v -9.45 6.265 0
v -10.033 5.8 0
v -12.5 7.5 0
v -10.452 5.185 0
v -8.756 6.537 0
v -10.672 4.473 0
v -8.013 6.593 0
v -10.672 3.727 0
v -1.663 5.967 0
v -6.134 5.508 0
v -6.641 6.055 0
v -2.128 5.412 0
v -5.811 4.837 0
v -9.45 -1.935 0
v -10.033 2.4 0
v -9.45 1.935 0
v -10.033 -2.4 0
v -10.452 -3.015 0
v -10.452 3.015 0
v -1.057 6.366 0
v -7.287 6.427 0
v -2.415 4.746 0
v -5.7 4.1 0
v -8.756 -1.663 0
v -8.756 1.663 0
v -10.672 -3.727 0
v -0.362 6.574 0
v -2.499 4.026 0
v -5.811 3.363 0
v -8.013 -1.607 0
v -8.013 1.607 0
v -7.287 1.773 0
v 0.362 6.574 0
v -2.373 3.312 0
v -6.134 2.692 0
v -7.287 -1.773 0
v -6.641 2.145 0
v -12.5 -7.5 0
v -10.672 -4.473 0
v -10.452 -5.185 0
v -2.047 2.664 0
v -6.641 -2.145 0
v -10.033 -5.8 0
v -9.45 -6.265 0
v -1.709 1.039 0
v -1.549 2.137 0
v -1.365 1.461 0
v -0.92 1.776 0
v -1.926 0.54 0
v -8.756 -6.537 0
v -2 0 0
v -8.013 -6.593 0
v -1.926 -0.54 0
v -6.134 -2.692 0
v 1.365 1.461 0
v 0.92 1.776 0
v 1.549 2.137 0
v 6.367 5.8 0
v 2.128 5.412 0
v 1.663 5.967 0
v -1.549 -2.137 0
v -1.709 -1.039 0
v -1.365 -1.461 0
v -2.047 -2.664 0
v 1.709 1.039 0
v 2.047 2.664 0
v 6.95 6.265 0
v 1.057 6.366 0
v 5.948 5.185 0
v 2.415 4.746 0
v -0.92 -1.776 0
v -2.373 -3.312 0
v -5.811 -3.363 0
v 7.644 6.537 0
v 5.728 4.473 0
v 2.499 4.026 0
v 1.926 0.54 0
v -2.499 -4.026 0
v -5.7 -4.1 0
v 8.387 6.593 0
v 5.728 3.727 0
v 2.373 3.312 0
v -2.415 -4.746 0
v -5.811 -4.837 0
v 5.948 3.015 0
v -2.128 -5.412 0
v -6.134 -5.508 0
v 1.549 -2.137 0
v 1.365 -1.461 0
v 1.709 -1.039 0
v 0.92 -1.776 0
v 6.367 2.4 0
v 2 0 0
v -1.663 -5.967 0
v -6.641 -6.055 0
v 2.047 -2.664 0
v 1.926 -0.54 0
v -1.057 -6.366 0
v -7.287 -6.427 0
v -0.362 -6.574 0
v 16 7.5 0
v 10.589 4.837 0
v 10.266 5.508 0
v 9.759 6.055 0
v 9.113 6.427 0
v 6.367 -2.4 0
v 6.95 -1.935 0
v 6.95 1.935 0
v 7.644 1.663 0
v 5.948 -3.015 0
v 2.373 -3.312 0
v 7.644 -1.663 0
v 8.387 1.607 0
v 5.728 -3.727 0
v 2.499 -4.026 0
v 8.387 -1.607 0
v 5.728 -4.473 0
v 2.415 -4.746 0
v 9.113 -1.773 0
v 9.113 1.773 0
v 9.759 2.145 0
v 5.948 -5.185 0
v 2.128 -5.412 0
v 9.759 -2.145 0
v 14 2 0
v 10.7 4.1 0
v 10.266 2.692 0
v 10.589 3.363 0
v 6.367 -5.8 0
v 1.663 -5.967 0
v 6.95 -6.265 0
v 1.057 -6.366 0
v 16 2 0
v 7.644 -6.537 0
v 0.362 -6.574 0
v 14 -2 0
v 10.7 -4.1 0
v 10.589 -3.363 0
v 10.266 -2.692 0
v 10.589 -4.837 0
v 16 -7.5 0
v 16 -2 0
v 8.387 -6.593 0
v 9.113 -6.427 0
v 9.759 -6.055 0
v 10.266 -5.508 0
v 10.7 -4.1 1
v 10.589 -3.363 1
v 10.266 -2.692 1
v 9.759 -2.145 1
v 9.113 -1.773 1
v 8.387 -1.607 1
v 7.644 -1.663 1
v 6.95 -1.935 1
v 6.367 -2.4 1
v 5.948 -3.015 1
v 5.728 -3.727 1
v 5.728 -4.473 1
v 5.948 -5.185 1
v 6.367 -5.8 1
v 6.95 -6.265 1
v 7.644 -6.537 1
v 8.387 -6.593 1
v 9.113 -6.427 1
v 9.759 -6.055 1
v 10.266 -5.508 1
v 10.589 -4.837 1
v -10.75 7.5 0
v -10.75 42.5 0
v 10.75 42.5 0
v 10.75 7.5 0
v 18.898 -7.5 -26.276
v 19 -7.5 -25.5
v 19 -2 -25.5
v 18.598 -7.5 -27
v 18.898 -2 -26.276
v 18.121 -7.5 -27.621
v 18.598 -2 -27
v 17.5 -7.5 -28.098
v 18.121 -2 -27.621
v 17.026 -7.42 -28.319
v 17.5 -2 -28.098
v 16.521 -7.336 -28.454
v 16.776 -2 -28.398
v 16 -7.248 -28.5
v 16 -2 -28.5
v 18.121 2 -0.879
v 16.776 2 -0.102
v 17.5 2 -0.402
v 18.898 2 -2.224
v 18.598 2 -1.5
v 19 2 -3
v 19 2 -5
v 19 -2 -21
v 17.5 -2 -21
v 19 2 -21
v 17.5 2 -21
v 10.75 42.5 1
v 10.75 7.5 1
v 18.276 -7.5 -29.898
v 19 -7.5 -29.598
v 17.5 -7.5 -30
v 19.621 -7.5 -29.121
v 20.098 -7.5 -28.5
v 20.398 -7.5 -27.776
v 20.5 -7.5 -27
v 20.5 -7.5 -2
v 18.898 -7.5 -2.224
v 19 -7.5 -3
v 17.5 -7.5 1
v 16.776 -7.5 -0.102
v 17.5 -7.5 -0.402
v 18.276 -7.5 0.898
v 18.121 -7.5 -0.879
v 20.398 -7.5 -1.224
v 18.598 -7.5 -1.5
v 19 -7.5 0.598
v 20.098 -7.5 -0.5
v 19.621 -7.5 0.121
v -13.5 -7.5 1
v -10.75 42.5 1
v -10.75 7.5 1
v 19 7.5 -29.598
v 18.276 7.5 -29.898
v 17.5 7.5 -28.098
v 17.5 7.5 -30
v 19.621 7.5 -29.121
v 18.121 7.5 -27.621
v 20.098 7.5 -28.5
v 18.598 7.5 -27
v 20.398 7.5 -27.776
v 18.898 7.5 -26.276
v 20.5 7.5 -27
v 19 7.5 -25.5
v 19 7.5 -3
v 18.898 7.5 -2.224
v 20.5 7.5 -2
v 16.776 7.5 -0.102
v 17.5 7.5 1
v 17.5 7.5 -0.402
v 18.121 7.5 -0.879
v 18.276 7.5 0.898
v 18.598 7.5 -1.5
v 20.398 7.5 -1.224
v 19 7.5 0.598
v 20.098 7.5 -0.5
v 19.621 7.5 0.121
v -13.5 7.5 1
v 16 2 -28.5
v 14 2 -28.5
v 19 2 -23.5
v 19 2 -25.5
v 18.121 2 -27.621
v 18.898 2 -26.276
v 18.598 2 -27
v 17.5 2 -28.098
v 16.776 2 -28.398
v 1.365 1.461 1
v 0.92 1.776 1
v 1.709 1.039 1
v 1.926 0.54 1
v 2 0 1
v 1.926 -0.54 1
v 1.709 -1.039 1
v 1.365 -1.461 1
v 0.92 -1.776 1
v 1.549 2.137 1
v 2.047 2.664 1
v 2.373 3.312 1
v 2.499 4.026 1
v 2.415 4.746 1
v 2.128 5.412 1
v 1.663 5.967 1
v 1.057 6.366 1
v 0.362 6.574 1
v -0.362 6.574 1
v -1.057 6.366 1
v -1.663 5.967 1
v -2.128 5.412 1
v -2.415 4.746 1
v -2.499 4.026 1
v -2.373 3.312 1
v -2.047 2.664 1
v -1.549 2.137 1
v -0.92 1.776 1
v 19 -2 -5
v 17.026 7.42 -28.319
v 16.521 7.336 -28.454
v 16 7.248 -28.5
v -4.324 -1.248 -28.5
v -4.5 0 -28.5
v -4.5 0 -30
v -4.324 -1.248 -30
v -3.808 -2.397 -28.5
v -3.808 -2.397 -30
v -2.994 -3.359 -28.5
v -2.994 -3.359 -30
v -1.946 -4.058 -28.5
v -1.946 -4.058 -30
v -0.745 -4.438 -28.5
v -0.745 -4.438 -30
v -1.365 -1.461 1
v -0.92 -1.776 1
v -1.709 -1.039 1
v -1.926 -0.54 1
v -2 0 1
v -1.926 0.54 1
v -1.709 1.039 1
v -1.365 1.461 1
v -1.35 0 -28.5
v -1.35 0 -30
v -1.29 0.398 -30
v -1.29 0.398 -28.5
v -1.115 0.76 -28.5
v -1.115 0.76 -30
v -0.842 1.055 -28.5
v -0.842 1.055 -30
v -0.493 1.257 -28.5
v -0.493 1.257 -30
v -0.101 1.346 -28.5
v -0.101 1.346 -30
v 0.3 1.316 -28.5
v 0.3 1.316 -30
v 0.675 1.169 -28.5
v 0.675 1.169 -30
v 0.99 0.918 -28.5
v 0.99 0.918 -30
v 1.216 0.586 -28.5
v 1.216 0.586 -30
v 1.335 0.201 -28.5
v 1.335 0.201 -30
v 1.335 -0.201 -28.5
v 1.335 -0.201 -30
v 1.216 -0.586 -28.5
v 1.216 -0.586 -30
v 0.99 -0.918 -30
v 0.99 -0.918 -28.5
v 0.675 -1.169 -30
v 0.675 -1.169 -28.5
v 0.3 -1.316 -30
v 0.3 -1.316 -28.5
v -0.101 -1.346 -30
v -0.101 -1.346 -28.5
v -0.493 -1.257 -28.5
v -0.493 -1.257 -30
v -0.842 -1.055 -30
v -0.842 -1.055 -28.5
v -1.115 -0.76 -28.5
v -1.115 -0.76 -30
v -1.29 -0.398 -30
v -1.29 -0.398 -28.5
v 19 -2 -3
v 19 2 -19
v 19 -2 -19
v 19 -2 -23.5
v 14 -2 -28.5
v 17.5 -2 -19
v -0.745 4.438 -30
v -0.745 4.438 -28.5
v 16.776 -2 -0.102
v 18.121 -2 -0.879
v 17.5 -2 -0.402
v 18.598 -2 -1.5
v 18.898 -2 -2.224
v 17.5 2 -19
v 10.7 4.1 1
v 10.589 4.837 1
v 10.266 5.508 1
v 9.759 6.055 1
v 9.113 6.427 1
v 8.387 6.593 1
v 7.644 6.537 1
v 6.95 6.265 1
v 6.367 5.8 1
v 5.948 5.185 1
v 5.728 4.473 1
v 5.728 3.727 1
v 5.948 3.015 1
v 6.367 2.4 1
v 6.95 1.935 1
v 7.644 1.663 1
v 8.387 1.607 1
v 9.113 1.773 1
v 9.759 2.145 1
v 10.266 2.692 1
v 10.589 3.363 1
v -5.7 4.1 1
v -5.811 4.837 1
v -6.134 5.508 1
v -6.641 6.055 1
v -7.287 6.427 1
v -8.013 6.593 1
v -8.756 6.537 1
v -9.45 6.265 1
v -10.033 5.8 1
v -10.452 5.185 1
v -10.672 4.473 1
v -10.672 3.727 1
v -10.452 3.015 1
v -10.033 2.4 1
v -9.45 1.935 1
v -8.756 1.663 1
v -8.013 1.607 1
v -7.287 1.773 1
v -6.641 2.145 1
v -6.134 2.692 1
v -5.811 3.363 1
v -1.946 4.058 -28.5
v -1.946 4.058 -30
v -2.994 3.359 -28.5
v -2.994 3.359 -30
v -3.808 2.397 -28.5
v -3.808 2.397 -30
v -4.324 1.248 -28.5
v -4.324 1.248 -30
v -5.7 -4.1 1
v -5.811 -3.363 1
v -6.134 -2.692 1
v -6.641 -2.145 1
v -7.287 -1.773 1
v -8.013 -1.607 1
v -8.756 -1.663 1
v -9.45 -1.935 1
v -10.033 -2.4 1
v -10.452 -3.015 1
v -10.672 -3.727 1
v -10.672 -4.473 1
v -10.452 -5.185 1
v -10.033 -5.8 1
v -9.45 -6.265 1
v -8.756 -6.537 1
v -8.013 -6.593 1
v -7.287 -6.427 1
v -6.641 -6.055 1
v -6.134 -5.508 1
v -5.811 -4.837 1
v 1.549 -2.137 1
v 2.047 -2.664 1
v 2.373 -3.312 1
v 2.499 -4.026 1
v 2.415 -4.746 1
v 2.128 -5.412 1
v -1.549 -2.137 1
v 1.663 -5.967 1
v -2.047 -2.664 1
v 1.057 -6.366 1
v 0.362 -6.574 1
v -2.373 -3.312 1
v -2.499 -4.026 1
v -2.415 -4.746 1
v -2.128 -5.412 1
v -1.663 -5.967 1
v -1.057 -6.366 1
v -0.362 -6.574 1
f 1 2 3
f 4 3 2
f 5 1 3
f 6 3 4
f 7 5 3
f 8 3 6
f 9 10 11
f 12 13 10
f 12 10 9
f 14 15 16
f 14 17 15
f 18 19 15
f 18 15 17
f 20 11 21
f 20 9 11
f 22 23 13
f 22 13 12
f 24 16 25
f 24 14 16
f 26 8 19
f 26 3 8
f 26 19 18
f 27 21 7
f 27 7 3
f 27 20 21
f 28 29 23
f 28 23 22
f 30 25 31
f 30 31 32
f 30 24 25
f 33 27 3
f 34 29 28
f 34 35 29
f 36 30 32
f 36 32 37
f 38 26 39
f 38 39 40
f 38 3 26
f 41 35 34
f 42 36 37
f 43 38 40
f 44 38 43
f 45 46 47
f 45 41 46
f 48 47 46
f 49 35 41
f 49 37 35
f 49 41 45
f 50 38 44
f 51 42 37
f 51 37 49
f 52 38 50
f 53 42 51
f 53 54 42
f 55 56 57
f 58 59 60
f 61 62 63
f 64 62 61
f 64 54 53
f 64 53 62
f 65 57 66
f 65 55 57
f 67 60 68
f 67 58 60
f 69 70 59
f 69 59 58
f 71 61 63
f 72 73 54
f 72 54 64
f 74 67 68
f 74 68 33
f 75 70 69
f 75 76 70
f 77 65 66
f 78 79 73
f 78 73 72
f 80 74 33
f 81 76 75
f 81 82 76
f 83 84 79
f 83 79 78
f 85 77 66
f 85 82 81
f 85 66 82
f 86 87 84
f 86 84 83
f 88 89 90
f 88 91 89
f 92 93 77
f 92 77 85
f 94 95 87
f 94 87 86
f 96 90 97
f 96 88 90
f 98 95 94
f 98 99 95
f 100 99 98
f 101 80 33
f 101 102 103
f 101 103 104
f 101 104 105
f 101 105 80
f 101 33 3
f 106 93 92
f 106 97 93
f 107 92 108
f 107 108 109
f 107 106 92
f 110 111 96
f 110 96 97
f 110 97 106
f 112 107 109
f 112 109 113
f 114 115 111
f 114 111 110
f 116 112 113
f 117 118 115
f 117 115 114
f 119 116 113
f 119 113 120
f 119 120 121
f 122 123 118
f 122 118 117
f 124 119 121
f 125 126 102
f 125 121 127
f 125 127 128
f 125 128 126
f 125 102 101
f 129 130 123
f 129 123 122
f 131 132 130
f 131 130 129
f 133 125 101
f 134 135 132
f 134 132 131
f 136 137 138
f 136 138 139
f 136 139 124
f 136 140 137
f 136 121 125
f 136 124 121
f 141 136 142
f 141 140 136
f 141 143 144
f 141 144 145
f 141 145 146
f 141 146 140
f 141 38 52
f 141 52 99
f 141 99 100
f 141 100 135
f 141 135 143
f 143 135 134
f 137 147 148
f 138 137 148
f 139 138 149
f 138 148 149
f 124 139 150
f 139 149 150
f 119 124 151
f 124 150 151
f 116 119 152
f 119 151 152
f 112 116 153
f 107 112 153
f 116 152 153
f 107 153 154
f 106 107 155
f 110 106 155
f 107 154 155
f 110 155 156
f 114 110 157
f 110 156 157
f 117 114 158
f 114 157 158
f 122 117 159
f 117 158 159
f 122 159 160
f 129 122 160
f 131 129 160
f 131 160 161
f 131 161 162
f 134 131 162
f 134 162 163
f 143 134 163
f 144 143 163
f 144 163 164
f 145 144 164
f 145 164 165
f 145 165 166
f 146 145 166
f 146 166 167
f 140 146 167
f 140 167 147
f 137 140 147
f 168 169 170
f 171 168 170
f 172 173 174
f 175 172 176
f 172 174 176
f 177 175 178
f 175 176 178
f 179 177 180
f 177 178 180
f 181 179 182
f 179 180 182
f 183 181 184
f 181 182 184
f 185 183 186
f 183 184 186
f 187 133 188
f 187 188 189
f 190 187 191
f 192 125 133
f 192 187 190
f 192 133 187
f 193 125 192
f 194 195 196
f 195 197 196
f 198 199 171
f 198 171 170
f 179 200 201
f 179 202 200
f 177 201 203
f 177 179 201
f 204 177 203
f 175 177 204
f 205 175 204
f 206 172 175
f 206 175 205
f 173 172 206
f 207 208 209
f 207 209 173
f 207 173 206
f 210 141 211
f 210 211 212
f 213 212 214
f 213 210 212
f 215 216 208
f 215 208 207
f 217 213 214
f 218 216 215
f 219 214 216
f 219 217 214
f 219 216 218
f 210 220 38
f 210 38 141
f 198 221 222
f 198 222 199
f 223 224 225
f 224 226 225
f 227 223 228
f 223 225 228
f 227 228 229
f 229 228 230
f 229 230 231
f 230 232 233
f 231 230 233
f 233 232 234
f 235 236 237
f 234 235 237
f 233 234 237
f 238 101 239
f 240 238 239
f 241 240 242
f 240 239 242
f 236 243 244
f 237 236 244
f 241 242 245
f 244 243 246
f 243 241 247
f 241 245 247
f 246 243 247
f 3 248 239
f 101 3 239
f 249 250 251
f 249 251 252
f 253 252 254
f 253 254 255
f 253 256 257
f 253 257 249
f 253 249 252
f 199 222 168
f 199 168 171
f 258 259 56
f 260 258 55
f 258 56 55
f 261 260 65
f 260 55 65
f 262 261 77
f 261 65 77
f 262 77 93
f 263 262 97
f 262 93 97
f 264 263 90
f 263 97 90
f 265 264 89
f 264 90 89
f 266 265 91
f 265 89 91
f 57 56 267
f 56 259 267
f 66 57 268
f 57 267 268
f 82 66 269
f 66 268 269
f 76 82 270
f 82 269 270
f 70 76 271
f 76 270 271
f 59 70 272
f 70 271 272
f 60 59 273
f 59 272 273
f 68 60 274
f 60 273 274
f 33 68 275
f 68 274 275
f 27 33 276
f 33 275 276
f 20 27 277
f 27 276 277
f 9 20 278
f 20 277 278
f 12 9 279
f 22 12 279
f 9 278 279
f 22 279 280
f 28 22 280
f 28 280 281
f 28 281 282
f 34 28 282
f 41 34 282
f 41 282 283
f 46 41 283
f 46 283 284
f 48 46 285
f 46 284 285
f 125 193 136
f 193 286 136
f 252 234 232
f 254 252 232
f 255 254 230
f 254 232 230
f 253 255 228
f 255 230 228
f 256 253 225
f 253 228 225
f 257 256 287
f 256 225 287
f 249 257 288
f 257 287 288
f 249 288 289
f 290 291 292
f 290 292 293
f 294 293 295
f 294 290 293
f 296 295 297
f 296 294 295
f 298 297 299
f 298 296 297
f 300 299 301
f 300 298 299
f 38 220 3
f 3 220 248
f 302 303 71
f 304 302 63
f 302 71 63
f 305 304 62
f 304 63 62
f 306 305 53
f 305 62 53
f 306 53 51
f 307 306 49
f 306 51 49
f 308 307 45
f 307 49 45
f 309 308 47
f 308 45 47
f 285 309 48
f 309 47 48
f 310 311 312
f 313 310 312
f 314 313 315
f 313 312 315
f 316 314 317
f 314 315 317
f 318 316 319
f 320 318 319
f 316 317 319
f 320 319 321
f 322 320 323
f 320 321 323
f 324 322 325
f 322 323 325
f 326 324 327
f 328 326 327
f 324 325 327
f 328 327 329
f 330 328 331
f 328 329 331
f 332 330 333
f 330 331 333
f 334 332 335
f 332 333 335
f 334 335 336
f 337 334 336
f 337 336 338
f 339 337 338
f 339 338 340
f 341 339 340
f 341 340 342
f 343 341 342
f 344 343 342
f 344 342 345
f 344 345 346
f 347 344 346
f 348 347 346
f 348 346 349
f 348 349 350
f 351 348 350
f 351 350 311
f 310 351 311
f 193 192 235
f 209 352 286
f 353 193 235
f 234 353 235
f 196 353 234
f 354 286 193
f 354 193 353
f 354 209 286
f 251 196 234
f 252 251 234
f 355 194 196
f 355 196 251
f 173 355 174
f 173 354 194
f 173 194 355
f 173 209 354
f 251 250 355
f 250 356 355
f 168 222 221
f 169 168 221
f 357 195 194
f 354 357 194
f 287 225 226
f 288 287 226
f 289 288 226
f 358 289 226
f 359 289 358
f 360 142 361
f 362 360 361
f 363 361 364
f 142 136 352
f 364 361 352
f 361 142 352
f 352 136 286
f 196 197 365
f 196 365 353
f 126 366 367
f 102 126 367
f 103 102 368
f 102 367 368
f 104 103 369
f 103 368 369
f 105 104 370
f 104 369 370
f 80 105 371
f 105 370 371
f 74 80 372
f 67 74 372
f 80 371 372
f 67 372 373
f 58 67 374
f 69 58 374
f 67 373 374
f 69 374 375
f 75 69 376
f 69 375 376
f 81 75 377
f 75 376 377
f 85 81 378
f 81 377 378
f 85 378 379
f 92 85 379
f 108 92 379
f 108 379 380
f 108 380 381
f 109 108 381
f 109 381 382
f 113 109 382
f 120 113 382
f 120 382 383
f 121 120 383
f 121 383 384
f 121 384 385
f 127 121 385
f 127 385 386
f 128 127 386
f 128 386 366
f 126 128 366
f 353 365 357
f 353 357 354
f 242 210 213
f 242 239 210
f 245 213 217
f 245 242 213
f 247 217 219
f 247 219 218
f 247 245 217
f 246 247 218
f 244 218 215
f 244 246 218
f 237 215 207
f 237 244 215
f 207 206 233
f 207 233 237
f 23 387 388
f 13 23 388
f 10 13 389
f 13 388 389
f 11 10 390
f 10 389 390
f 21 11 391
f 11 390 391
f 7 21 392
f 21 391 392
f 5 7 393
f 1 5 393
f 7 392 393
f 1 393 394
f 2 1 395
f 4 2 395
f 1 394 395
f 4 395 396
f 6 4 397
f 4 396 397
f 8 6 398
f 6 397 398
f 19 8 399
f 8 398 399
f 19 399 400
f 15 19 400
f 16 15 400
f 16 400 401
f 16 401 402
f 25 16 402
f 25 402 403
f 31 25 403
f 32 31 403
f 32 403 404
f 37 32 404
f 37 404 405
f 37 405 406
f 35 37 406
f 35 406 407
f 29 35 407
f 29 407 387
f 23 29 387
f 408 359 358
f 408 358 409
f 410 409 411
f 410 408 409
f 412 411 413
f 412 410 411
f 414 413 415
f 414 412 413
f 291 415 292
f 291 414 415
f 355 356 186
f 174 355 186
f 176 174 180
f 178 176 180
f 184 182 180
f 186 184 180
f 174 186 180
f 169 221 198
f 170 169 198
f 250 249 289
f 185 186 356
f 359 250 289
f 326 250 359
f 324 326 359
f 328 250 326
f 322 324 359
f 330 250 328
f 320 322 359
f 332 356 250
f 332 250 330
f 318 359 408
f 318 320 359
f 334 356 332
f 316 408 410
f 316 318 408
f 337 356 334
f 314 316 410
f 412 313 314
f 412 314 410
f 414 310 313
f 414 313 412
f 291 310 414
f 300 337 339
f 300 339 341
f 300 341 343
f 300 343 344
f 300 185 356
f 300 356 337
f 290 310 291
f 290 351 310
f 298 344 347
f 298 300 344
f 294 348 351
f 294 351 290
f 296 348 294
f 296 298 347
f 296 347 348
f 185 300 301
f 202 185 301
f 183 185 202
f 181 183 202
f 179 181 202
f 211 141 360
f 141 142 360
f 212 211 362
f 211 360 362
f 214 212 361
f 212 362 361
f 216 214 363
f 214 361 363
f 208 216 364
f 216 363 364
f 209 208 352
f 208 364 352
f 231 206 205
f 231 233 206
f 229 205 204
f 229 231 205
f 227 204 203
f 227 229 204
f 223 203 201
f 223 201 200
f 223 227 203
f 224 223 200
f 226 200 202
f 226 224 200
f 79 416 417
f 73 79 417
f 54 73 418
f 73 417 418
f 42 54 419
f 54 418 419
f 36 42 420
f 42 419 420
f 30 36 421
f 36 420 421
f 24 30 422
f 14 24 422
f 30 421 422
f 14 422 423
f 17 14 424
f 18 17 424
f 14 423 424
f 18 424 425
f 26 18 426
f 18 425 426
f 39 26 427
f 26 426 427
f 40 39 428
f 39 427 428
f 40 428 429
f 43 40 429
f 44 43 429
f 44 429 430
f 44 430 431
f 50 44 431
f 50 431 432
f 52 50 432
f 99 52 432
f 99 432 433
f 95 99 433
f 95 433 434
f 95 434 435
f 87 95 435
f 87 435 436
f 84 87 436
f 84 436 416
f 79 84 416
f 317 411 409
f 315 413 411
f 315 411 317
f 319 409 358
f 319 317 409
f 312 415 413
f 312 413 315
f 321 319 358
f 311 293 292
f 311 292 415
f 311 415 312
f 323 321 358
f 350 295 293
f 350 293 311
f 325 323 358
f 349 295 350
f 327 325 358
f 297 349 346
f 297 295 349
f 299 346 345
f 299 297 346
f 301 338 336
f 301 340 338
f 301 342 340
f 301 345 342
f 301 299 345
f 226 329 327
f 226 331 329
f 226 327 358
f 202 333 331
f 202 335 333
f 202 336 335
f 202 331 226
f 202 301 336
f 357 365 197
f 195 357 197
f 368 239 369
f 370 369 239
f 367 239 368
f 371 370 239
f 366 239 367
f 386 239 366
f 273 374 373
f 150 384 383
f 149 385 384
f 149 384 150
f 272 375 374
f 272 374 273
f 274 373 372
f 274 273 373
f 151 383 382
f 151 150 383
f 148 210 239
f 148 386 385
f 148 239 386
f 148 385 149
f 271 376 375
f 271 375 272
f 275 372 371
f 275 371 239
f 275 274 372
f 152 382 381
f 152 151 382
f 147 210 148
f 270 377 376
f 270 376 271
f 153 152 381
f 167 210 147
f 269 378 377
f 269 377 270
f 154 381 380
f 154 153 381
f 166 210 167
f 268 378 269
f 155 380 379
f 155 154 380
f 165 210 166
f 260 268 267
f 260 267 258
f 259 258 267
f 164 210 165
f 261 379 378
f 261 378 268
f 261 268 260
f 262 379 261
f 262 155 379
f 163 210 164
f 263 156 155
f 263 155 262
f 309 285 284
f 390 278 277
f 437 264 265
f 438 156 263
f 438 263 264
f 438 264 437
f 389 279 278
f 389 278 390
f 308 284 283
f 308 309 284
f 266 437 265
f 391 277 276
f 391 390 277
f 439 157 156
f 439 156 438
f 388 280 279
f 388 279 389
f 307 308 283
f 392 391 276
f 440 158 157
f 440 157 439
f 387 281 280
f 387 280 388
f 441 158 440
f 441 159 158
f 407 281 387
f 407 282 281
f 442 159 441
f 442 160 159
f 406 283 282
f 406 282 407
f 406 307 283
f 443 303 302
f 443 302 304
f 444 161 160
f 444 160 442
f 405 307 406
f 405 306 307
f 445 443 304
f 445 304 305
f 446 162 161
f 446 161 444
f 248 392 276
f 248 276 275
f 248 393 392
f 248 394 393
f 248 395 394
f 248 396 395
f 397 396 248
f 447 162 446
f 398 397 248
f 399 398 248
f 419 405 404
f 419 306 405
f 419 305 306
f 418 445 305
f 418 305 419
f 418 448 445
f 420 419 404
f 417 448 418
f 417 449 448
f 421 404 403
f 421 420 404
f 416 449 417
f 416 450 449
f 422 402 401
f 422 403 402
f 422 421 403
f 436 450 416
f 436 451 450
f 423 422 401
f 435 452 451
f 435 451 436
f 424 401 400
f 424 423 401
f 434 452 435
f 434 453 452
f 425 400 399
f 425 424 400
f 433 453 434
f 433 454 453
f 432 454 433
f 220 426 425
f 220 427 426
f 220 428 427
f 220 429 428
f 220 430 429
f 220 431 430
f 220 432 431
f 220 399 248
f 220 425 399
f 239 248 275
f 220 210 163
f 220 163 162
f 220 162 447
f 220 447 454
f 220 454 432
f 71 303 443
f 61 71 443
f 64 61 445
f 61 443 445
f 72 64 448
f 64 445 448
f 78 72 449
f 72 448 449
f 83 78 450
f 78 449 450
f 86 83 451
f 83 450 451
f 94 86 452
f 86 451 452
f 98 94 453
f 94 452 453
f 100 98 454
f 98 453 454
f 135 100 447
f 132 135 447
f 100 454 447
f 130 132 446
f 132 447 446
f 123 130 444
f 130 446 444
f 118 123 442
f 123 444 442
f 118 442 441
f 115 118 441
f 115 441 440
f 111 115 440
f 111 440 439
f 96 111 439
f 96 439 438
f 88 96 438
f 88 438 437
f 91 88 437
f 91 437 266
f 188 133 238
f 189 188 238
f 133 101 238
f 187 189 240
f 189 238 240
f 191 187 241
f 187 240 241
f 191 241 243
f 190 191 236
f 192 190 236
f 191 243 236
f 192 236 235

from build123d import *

# Parameters (mm, degrees)
SKETCH_1_W          = 27
SKETCH_1_H          = 15
EXTRUDE_1_DEPTH     = 1
SKETCH_2_R          = 2.5
CUT_EXTRUDE_1_DEPTH = 16.475787541
EXTRUDE_2_DEPTH     = 15
SKETCH_6_W          = 1.5
SKETCH_6_H          = 2
EXTRUDE_3_DEPTH     = 2
CHAMFER_1_SIZE      = 1
CUT_EXTRUDE_4_REACH = 39.101
SKETCH_8_R          = 2
SKETCH_9_W          = 21.5
SKETCH_9_H          = 35
EXTRUDE_4_DEPTH     = 1
SKETCH_7_R          = 1.35
CUT_EXTRUDE_5_DEPTH = 10
FILLET_1_R          = 3
CUT_EXTRUDE_START   = -1.901924
CUT_EXTRUDE_6_DEPTH = 1.901924


with BuildPart() as part:
    # 草图1 → 凸台-拉伸1 (new body)
    with BuildSketch(Plane.XY):
        Rectangle(SKETCH_1_W, SKETCH_1_H)
    extrude(amount=EXTRUDE_1_DEPTH)

    # 草图2 → 切除-拉伸1 (cut, through all)
    with BuildSketch(Plane.XY.offset(1)):
        with Locations((0, 4.1)):
            Circle(SKETCH_2_R)
        with Locations((0, -4.1)):
            Circle(SKETCH_2_R)
        with Locations((8.2, 4.1)):
            Circle(SKETCH_2_R)
        with Locations((8.2, -4.1)):
            Circle(SKETCH_2_R)
        with Locations((-8.2, 4.1)):
            Circle(SKETCH_2_R)
        with Locations((-8.2, -4.1)):
            Circle(SKETCH_2_R)
    extrude(amount=-CUT_EXTRUDE_1_DEPTH, mode=Mode.SUBTRACT)

    # 草图3 → 凸台-拉伸2 (add)
    with BuildSketch(Plane.XZ.offset(7.5)):
        Polygon((13.5, 0), (19, 0), (19, -28.5), (-4.5, -28.5), (-4.5, -30), (20.5, -30), (20.5, 1), (13.5, 1), align=None)
    extrude(amount=-EXTRUDE_2_DEPTH)

    # 草图6 → 凸台-拉伸3 (add, symmetric)
    with BuildSketch(Plane(origin=(0, 0, 0), x_dir=(1, 0, 0), z_dir=(0, 1, 0))):
        Polygon((19, 0), (19, 5), (14, 0), align=None)
        Polygon((19, 28.5), (14, 28.5), (19, 23.5), align=None)
        with Locations((18.25, 20)):
            Rectangle(SKETCH_6_W, SKETCH_6_H)
    extrude(amount=EXTRUDE_3_DEPTH, both=True)

    # 倒角1
    chamfer_1_edges = [part.edges().sort_by_distance(p)[0] for p in [
        (-13.5, 0, 0),
    ]]
    chamfer(chamfer_1_edges, length=CHAMFER_1_SIZE - 0.0001)  # a hair under: the kernel refuses the full size

    # 草图8 → 切除-拉伸4 (cut, up to next)
    with BuildSketch(Plane(origin=(0, 0, 0), x_dir=(-1, 0, 0), z_dir=(0, 0, -1)), mode=Mode.PRIVATE) as cut_extrude_4_sk1:
        Circle(SKETCH_8_R)
    cut_extrude_4_tool1 = extrude(cut_extrude_4_sk1.sketch, amount=-CUT_EXTRUDE_4_REACH, mode=Mode.PRIVATE) & part.part
    add(cut_extrude_4_tool1.solids().sort_by_distance((0, 0, 0))[0], mode=Mode.SUBTRACT)

    # 草图7 → 切除-拉伸5 (cut)
    with BuildSketch(Plane(origin=(0, 0, -30), x_dir=(-1, 0, 0), z_dir=(0, 0, -1))):
        Circle(SKETCH_7_R)
    extrude(amount=-CUT_EXTRUDE_5_DEPTH, mode=Mode.SUBTRACT)

    # 圆角1
    fillet_1_edges = [part.edges().sort_by_distance(p)[0] for p in [
        (20.5, 0, 1),
        (20.5, 0, -30),
        (19, 4.75, -28.5),
        (19, 4.75, 0),
        (19, -4.75, 0),
        (19, -4.75, -28.5),
    ]]
    fillet(fillet_1_edges, radius=FILLET_1_R)

    # 草图10 → 切除-拉伸6 (cut)
    with BuildSketch(Plane(origin=(0, 0, -30), x_dir=(-1, 0, 0), z_dir=(0, 0, -1)).offset(CUT_EXTRUDE_START)):
        with BuildLine():
            Line((-17.5, 7.5), (0.744827586, 4.437931034))
            ThreePointArc((0.744827586, 4.437931034), (3.435238284, 2.906740087), (4.5, 0))
            Line((4.5, 0), (4.5, 7.5))
            Line((4.5, 7.5), (-17.5, 7.5))
        make_face()
        with BuildLine():
            Line((4.5, -7.5), (4.5, 0))
            ThreePointArc((4.5, 0), (3.435238284, -2.906740087), (0.744827586, -4.437931034))
            Line((0.744827586, -4.437931034), (-17.5, -7.5))
            Line((-17.5, -7.5), (4.5, -7.5))
        make_face()
    extrude(amount=CUT_EXTRUDE_6_DEPTH, mode=Mode.SUBTRACT)


with BuildPart() as body_2:
    # 草图9 → 凸台-拉伸4 (new body)
    with BuildSketch(Plane.XY.offset(1)):
        with Locations((0, 25)):
            Rectangle(SKETCH_9_W, SKETCH_9_H)
    extrude(amount=-EXTRUDE_4_DEPTH)


solid = Compound([part.part, body_2.part])
